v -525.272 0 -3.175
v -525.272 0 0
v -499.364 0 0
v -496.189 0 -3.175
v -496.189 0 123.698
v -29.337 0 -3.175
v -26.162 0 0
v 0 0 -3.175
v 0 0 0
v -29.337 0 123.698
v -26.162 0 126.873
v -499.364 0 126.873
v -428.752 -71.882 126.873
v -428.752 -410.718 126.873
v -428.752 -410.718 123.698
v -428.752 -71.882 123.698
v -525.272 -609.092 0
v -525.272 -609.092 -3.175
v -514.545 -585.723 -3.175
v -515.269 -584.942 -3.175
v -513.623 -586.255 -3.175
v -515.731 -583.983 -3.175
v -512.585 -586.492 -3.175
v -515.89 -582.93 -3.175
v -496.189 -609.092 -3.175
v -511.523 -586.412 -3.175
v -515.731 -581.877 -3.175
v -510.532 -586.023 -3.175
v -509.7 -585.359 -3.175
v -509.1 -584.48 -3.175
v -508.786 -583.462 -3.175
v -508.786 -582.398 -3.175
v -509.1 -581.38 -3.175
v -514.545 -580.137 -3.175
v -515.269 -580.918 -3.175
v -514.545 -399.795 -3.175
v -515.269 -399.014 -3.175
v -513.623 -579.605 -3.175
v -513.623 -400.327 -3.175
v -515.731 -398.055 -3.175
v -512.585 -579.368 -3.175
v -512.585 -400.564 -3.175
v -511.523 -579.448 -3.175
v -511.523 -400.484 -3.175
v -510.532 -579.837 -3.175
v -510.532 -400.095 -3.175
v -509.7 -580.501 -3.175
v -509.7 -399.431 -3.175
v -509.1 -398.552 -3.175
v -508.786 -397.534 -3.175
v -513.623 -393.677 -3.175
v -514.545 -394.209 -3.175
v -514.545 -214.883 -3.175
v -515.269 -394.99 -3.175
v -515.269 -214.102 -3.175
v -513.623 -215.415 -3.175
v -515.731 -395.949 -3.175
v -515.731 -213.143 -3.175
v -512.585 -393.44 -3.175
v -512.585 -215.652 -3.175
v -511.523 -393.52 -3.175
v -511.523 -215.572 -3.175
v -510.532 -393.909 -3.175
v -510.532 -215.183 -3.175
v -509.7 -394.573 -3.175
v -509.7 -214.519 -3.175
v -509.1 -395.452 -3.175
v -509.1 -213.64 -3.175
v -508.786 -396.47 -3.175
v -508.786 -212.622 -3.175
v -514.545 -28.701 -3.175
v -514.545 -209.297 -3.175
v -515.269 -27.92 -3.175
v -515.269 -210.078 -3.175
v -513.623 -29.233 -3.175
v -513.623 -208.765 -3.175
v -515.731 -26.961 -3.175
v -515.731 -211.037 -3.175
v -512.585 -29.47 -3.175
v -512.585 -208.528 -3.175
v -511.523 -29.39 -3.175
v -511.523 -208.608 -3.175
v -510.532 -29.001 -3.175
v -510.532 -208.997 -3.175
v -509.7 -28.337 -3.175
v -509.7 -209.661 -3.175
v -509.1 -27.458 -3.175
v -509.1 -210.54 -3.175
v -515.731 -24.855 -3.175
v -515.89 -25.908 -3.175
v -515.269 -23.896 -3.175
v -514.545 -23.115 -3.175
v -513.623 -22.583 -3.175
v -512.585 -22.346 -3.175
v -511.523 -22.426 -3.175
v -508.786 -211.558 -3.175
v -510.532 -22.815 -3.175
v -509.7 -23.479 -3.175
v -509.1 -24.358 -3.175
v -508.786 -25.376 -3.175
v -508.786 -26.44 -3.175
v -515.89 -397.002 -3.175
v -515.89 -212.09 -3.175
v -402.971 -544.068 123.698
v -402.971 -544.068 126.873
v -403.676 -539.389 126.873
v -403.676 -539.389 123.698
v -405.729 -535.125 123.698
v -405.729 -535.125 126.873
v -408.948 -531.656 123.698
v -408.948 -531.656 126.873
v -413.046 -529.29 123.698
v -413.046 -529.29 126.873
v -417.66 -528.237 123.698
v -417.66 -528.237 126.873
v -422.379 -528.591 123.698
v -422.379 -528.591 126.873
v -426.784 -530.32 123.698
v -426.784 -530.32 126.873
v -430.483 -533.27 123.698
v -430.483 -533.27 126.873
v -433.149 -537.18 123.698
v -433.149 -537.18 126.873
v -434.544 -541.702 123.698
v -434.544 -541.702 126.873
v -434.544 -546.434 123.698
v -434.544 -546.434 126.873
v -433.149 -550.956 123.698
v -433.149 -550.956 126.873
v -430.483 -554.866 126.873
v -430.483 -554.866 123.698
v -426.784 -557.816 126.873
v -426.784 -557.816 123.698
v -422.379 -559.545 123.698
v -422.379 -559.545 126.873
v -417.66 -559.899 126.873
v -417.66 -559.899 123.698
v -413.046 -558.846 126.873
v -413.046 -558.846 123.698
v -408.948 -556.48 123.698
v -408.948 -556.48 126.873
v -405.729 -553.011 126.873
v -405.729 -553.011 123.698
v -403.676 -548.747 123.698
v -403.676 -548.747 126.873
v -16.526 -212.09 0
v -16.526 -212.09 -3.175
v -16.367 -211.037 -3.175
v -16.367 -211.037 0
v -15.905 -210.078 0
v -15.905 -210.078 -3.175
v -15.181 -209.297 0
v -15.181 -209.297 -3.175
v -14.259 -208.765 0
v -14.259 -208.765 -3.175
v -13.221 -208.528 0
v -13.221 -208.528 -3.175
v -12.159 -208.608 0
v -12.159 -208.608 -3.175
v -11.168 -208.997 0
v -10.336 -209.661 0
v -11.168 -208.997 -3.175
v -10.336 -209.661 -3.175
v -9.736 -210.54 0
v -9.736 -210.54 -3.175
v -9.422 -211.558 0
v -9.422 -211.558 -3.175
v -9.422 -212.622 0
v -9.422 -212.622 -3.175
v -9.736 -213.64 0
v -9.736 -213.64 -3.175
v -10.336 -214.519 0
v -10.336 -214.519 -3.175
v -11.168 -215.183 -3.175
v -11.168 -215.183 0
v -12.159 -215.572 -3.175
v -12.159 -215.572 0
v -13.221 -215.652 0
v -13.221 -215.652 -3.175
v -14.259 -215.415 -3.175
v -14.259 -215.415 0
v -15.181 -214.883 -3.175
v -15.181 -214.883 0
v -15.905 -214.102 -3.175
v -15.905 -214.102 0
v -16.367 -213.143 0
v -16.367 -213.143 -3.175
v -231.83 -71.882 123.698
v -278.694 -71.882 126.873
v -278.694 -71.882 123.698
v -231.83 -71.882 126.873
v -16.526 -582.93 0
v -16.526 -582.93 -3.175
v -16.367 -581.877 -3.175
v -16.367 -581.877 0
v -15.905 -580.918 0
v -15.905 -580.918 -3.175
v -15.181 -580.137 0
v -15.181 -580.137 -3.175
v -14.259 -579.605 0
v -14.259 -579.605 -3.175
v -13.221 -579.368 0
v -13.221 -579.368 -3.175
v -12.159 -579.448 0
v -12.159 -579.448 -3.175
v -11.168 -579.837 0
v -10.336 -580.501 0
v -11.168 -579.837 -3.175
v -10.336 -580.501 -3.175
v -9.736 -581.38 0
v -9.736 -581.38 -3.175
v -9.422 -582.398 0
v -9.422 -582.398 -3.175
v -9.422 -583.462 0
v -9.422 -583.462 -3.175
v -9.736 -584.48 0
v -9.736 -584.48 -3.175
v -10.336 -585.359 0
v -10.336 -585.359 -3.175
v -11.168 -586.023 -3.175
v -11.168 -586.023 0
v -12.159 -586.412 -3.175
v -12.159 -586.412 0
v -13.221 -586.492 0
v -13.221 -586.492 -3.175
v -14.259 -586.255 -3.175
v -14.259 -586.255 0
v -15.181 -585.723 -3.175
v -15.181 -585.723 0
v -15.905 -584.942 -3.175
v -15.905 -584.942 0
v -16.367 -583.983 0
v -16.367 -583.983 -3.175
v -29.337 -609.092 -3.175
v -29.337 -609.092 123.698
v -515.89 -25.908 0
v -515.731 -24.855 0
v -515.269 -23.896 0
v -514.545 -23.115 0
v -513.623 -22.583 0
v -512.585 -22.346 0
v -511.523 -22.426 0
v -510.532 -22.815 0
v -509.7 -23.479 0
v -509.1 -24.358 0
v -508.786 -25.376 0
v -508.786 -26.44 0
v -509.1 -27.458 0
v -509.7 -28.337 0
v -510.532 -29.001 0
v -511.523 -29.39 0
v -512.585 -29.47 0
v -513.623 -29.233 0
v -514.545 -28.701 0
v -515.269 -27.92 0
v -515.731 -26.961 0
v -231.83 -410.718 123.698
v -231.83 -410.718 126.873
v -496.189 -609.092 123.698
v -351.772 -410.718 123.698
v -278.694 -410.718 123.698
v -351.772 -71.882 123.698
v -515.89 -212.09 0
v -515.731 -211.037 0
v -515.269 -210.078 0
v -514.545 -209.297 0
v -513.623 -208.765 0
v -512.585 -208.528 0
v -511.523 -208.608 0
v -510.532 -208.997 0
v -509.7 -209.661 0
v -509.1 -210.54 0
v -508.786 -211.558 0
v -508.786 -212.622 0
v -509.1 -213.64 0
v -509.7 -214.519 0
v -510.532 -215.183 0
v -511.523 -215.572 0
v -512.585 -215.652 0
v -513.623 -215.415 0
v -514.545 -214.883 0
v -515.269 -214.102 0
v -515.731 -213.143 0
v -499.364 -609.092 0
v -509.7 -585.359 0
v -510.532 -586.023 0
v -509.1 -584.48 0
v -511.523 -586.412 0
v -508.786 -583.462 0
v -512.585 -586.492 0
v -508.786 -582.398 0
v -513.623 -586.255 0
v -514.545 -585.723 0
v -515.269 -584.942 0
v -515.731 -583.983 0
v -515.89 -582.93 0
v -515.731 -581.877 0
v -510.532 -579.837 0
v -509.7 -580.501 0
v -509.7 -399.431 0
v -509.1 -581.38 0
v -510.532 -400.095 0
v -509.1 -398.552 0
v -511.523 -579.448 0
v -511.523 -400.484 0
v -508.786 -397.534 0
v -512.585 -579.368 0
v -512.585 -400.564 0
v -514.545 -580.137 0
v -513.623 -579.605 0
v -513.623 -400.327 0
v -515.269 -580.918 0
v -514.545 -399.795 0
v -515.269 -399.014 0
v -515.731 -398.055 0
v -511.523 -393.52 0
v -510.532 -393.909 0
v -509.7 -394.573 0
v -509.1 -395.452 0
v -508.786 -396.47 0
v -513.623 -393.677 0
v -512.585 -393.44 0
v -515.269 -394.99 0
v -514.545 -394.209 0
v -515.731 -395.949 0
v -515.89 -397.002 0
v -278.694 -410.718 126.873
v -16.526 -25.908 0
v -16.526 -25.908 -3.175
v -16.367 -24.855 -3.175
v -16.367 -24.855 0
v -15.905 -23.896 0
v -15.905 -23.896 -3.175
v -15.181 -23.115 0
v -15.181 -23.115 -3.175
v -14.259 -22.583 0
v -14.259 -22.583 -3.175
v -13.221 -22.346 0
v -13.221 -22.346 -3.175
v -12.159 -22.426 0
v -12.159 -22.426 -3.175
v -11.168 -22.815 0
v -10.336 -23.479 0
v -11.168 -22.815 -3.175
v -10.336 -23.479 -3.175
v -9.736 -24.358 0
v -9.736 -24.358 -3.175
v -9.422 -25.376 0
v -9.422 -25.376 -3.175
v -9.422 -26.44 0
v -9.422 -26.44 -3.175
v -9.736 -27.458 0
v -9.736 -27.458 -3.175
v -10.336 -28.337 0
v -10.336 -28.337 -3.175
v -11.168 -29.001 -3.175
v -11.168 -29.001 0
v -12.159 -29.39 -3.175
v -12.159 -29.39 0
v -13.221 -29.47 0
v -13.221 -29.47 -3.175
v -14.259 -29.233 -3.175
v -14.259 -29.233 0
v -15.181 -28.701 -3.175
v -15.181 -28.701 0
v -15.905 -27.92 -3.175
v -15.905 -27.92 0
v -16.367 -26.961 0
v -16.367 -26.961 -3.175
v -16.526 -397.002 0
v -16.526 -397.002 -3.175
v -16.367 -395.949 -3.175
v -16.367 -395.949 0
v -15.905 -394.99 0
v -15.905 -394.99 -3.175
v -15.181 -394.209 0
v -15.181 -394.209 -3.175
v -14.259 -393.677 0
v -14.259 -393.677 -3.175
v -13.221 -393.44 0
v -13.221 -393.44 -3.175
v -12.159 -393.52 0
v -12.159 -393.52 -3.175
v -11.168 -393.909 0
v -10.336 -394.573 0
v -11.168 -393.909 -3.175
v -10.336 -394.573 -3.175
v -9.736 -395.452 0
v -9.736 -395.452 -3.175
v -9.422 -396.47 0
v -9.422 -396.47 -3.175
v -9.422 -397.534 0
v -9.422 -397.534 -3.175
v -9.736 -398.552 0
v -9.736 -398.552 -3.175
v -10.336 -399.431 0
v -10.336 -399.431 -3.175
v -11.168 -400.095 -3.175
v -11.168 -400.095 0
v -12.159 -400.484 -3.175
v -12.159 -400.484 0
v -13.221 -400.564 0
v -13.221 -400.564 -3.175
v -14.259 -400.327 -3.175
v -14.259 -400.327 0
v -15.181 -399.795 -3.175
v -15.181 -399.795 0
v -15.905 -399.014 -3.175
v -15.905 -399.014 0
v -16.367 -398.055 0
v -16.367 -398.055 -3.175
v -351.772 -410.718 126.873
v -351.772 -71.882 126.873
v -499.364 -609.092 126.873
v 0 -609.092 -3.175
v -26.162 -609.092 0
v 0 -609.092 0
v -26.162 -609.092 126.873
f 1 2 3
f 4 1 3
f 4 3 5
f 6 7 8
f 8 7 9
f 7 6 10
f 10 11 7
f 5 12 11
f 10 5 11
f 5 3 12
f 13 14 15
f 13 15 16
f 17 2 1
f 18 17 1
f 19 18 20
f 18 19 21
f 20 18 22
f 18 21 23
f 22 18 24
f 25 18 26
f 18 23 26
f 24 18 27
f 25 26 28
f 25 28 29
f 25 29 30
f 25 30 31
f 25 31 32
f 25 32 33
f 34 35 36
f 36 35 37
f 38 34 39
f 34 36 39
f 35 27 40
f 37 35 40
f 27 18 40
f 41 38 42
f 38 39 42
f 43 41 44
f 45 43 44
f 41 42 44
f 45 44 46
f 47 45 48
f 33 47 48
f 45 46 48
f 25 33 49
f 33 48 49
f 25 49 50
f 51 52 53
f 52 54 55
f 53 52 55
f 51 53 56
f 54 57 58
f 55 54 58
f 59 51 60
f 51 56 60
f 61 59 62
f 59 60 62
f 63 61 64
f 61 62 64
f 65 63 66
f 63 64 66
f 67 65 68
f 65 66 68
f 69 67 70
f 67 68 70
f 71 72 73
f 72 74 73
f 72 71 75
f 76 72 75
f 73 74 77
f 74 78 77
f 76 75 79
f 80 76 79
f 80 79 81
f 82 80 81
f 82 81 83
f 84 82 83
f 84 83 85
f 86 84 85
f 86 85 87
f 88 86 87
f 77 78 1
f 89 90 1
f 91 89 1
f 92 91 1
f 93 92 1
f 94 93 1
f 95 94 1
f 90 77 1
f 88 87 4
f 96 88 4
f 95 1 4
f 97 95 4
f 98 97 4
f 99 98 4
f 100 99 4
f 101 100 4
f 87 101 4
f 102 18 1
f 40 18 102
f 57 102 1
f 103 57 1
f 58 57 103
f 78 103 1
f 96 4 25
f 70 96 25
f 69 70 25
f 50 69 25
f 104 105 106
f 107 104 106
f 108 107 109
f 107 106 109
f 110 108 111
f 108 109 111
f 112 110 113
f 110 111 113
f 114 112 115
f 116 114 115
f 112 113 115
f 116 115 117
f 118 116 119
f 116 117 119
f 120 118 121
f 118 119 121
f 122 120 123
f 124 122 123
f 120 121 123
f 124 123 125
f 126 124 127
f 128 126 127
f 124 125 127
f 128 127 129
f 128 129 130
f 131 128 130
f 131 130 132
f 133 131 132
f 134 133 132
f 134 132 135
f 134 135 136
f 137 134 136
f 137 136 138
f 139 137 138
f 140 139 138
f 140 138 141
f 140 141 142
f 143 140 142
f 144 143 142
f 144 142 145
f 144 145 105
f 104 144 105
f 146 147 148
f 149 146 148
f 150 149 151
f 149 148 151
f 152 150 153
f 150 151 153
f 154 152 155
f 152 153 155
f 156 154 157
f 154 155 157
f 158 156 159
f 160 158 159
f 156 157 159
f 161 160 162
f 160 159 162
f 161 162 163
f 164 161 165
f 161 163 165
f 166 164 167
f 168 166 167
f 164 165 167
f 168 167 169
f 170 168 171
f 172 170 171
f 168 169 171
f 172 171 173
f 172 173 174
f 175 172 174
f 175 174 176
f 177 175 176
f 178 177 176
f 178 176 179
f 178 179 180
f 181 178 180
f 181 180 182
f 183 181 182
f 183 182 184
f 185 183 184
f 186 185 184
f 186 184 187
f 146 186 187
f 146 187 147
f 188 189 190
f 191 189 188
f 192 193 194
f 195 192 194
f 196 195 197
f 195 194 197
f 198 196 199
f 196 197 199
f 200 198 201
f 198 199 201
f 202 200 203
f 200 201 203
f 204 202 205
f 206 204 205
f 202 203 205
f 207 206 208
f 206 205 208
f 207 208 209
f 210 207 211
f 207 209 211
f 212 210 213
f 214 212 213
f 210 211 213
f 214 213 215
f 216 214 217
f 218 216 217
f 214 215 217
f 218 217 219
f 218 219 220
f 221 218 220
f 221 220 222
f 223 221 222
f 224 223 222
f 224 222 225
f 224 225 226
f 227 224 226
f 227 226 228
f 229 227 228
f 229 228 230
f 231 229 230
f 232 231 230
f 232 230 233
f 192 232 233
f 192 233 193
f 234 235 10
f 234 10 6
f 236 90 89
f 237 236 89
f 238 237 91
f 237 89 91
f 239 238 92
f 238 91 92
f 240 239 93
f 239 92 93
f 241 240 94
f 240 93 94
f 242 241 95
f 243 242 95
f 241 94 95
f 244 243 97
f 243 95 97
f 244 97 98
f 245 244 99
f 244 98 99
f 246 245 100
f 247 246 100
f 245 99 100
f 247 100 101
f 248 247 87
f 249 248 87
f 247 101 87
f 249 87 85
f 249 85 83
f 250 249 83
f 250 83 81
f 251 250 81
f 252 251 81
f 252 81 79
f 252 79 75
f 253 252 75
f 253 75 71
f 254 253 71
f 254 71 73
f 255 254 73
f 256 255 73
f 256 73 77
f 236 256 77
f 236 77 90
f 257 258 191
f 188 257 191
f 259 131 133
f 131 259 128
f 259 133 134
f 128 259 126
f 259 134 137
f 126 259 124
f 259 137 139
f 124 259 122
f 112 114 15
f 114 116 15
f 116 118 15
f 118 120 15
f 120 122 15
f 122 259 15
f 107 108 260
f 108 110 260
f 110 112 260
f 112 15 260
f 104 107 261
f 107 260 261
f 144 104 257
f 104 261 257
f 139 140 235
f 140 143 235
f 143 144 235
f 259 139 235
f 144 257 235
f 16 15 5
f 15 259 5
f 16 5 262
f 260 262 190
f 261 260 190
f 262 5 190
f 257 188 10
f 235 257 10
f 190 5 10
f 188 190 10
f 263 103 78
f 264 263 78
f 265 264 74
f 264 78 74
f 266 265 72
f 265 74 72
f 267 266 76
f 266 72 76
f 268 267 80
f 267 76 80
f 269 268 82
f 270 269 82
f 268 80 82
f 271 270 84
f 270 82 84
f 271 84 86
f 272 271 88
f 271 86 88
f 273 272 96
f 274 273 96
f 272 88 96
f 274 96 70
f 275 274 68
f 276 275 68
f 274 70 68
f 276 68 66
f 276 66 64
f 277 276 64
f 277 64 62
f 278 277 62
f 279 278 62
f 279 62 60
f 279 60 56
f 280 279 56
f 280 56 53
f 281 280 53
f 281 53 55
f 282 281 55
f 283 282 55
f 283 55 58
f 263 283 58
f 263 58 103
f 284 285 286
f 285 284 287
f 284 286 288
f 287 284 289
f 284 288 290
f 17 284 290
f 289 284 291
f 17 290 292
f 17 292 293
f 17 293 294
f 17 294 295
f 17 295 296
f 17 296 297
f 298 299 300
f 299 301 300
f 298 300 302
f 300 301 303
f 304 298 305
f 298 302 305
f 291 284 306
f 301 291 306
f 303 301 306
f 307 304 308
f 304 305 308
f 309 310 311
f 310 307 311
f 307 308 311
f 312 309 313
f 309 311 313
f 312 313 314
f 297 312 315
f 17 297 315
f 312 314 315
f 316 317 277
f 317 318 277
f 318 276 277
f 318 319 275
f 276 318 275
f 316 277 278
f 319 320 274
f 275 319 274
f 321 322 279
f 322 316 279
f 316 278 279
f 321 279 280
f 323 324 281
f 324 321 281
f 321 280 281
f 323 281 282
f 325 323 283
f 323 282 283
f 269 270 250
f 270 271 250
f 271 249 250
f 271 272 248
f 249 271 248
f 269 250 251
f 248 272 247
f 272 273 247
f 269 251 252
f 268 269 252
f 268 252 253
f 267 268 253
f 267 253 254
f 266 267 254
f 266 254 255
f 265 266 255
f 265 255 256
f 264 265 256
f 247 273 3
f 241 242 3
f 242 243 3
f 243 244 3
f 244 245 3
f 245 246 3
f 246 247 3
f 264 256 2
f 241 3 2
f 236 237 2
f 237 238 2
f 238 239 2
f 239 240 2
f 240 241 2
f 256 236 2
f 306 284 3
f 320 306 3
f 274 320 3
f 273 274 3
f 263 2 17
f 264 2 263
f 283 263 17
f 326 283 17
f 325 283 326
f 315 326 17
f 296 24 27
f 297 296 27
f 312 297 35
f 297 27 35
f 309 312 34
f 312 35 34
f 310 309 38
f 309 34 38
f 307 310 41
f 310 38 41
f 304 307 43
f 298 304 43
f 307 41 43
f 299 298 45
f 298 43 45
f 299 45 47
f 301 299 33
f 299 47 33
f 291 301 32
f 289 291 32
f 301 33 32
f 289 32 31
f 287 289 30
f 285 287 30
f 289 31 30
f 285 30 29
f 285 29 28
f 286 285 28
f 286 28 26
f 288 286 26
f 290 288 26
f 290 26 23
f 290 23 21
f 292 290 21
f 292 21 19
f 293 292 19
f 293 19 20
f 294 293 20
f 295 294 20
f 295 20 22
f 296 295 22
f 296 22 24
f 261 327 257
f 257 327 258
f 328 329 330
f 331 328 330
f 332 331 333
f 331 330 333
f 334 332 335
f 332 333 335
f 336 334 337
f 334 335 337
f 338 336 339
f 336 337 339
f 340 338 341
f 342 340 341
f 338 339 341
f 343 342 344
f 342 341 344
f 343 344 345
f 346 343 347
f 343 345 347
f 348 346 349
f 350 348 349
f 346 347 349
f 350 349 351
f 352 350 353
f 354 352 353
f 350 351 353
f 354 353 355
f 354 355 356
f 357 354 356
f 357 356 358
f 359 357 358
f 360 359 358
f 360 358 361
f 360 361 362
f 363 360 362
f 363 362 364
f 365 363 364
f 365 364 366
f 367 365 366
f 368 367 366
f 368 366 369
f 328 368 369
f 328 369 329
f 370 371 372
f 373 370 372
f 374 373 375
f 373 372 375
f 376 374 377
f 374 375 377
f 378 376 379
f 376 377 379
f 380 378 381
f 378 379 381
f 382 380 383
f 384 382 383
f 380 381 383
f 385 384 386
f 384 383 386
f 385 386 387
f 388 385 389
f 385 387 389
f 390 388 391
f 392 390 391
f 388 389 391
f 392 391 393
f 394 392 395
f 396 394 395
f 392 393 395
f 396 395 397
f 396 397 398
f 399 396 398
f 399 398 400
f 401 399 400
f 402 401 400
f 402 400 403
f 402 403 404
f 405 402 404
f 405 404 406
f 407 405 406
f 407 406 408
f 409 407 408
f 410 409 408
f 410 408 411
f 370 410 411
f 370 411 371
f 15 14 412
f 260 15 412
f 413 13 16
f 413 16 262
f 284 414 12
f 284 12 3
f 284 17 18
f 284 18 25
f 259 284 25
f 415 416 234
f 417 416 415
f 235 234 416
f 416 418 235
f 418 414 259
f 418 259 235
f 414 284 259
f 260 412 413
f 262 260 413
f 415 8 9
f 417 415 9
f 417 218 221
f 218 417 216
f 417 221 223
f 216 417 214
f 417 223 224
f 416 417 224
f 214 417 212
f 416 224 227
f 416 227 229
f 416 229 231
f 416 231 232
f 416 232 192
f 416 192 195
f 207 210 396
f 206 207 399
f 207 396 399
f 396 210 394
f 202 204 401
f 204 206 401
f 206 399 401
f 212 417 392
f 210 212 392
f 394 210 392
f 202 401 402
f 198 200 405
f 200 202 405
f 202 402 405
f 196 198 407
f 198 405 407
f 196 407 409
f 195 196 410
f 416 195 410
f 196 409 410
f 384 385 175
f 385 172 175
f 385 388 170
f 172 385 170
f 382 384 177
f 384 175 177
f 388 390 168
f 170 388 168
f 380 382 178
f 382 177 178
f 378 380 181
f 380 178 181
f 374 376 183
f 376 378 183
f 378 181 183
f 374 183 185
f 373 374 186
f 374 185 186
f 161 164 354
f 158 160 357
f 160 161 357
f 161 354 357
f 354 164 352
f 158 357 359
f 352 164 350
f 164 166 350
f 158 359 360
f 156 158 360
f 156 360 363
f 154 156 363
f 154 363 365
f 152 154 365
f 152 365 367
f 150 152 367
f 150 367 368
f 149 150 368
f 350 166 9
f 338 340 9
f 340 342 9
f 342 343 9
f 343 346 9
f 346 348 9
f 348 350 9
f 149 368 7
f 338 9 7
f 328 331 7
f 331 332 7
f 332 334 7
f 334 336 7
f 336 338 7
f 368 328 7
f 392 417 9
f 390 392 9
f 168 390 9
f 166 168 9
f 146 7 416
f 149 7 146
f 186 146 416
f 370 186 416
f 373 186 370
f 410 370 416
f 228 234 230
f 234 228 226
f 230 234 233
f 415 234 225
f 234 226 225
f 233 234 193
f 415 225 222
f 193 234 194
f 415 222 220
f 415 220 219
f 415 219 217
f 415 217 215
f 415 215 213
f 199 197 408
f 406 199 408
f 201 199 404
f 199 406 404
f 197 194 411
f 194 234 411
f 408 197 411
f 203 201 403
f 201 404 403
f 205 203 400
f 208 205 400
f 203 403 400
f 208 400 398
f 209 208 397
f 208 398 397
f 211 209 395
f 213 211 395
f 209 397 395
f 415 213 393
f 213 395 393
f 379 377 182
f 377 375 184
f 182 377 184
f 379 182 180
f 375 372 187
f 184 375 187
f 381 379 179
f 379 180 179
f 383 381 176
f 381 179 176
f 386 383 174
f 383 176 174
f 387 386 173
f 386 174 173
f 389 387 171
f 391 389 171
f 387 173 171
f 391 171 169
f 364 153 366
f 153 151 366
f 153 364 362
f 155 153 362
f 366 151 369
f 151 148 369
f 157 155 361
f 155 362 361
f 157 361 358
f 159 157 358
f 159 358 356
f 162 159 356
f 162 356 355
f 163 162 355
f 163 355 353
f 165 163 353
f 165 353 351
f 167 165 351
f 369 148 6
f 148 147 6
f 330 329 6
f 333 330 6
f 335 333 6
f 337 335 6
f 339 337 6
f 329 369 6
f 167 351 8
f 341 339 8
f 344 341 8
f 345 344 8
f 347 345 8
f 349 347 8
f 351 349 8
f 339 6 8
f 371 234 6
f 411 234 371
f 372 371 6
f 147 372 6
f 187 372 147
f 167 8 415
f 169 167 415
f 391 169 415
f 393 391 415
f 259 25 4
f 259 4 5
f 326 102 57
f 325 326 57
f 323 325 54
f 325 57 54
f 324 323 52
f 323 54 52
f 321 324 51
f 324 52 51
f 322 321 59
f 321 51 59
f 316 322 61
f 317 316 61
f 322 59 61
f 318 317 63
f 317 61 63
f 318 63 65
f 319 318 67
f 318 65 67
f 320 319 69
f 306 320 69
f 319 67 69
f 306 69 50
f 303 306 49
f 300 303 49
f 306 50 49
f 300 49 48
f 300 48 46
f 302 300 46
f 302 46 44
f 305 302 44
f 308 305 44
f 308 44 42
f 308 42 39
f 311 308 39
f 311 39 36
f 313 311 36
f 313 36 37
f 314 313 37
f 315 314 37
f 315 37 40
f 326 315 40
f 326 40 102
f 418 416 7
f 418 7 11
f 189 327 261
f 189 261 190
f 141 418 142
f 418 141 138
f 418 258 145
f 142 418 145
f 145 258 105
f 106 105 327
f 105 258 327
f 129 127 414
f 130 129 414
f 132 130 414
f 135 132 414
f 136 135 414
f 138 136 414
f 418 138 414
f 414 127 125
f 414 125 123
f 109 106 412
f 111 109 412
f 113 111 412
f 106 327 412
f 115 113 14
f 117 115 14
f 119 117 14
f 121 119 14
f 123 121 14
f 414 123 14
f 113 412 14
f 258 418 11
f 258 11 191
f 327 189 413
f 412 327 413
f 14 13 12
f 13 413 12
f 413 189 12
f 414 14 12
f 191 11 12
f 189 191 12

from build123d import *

# Parameters (mm, degrees)
F1_DEPTH = 609.092
F3_W     = 76.98
F3_H     = 338.836
F3_W_2   = 46.863
F4_DEPTH = 25.4
F6_R     = 15.875
F7_DEPTH = 25.4
F8_D     = 7.14375


# Not quite as in the source:
# - a length typed as a fraction of an inch, garbled in the dataset ("3 / 203.2 mm" for 3/8 in), is restored


with BuildPart() as f1:
    # F0 (on Front) → F1 (new body)
    with BuildSketch(Plane.XZ):
        Polygon((0, -3.175), (0, 0), (-26.162, 0), (-26.162, 126.873), (-499.364, 126.873), (-499.364, 0), (-525.272, 0), (-525.272, -3.175), (-496.189, -3.175), (-496.189, 123.698), (-29.337, 123.698), (-29.337, -3.175), align=None)
    extrude(amount=F1_DEPTH)

    # F3 (on face) → F4 (cut)
    with BuildSketch(Plane.XY.offset(126.873)):
        with Locations((-390.262, -241.3)):
            Rectangle(F3_W, F3_H)
        with Locations((-255.262, -241.3)):
            Rectangle(F3_W_2, F3_H)
    extrude(amount=-F4_DEPTH, mode=Mode.SUBTRACT)

    # F6 (on face) → F7 (cut)
    with BuildSketch(Plane.XY.offset(126.873)):
        with Locations((-418.846, -544.068)):
            Circle(F6_R)
    extrude(amount=-F7_DEPTH, mode=Mode.SUBTRACT)

    # F8 (through all)
    with Locations(Plane.XY):
        with Locations((-512.318, -25.908), (-512.318, -212.09), (-512.318, -397.002), (-512.318, -582.93), (-12.954, -582.93), (-12.954, -397.002), (-12.954, -212.09), (-12.954, -25.908)):
            Hole(F8_D / 2)


solid = f1.part
